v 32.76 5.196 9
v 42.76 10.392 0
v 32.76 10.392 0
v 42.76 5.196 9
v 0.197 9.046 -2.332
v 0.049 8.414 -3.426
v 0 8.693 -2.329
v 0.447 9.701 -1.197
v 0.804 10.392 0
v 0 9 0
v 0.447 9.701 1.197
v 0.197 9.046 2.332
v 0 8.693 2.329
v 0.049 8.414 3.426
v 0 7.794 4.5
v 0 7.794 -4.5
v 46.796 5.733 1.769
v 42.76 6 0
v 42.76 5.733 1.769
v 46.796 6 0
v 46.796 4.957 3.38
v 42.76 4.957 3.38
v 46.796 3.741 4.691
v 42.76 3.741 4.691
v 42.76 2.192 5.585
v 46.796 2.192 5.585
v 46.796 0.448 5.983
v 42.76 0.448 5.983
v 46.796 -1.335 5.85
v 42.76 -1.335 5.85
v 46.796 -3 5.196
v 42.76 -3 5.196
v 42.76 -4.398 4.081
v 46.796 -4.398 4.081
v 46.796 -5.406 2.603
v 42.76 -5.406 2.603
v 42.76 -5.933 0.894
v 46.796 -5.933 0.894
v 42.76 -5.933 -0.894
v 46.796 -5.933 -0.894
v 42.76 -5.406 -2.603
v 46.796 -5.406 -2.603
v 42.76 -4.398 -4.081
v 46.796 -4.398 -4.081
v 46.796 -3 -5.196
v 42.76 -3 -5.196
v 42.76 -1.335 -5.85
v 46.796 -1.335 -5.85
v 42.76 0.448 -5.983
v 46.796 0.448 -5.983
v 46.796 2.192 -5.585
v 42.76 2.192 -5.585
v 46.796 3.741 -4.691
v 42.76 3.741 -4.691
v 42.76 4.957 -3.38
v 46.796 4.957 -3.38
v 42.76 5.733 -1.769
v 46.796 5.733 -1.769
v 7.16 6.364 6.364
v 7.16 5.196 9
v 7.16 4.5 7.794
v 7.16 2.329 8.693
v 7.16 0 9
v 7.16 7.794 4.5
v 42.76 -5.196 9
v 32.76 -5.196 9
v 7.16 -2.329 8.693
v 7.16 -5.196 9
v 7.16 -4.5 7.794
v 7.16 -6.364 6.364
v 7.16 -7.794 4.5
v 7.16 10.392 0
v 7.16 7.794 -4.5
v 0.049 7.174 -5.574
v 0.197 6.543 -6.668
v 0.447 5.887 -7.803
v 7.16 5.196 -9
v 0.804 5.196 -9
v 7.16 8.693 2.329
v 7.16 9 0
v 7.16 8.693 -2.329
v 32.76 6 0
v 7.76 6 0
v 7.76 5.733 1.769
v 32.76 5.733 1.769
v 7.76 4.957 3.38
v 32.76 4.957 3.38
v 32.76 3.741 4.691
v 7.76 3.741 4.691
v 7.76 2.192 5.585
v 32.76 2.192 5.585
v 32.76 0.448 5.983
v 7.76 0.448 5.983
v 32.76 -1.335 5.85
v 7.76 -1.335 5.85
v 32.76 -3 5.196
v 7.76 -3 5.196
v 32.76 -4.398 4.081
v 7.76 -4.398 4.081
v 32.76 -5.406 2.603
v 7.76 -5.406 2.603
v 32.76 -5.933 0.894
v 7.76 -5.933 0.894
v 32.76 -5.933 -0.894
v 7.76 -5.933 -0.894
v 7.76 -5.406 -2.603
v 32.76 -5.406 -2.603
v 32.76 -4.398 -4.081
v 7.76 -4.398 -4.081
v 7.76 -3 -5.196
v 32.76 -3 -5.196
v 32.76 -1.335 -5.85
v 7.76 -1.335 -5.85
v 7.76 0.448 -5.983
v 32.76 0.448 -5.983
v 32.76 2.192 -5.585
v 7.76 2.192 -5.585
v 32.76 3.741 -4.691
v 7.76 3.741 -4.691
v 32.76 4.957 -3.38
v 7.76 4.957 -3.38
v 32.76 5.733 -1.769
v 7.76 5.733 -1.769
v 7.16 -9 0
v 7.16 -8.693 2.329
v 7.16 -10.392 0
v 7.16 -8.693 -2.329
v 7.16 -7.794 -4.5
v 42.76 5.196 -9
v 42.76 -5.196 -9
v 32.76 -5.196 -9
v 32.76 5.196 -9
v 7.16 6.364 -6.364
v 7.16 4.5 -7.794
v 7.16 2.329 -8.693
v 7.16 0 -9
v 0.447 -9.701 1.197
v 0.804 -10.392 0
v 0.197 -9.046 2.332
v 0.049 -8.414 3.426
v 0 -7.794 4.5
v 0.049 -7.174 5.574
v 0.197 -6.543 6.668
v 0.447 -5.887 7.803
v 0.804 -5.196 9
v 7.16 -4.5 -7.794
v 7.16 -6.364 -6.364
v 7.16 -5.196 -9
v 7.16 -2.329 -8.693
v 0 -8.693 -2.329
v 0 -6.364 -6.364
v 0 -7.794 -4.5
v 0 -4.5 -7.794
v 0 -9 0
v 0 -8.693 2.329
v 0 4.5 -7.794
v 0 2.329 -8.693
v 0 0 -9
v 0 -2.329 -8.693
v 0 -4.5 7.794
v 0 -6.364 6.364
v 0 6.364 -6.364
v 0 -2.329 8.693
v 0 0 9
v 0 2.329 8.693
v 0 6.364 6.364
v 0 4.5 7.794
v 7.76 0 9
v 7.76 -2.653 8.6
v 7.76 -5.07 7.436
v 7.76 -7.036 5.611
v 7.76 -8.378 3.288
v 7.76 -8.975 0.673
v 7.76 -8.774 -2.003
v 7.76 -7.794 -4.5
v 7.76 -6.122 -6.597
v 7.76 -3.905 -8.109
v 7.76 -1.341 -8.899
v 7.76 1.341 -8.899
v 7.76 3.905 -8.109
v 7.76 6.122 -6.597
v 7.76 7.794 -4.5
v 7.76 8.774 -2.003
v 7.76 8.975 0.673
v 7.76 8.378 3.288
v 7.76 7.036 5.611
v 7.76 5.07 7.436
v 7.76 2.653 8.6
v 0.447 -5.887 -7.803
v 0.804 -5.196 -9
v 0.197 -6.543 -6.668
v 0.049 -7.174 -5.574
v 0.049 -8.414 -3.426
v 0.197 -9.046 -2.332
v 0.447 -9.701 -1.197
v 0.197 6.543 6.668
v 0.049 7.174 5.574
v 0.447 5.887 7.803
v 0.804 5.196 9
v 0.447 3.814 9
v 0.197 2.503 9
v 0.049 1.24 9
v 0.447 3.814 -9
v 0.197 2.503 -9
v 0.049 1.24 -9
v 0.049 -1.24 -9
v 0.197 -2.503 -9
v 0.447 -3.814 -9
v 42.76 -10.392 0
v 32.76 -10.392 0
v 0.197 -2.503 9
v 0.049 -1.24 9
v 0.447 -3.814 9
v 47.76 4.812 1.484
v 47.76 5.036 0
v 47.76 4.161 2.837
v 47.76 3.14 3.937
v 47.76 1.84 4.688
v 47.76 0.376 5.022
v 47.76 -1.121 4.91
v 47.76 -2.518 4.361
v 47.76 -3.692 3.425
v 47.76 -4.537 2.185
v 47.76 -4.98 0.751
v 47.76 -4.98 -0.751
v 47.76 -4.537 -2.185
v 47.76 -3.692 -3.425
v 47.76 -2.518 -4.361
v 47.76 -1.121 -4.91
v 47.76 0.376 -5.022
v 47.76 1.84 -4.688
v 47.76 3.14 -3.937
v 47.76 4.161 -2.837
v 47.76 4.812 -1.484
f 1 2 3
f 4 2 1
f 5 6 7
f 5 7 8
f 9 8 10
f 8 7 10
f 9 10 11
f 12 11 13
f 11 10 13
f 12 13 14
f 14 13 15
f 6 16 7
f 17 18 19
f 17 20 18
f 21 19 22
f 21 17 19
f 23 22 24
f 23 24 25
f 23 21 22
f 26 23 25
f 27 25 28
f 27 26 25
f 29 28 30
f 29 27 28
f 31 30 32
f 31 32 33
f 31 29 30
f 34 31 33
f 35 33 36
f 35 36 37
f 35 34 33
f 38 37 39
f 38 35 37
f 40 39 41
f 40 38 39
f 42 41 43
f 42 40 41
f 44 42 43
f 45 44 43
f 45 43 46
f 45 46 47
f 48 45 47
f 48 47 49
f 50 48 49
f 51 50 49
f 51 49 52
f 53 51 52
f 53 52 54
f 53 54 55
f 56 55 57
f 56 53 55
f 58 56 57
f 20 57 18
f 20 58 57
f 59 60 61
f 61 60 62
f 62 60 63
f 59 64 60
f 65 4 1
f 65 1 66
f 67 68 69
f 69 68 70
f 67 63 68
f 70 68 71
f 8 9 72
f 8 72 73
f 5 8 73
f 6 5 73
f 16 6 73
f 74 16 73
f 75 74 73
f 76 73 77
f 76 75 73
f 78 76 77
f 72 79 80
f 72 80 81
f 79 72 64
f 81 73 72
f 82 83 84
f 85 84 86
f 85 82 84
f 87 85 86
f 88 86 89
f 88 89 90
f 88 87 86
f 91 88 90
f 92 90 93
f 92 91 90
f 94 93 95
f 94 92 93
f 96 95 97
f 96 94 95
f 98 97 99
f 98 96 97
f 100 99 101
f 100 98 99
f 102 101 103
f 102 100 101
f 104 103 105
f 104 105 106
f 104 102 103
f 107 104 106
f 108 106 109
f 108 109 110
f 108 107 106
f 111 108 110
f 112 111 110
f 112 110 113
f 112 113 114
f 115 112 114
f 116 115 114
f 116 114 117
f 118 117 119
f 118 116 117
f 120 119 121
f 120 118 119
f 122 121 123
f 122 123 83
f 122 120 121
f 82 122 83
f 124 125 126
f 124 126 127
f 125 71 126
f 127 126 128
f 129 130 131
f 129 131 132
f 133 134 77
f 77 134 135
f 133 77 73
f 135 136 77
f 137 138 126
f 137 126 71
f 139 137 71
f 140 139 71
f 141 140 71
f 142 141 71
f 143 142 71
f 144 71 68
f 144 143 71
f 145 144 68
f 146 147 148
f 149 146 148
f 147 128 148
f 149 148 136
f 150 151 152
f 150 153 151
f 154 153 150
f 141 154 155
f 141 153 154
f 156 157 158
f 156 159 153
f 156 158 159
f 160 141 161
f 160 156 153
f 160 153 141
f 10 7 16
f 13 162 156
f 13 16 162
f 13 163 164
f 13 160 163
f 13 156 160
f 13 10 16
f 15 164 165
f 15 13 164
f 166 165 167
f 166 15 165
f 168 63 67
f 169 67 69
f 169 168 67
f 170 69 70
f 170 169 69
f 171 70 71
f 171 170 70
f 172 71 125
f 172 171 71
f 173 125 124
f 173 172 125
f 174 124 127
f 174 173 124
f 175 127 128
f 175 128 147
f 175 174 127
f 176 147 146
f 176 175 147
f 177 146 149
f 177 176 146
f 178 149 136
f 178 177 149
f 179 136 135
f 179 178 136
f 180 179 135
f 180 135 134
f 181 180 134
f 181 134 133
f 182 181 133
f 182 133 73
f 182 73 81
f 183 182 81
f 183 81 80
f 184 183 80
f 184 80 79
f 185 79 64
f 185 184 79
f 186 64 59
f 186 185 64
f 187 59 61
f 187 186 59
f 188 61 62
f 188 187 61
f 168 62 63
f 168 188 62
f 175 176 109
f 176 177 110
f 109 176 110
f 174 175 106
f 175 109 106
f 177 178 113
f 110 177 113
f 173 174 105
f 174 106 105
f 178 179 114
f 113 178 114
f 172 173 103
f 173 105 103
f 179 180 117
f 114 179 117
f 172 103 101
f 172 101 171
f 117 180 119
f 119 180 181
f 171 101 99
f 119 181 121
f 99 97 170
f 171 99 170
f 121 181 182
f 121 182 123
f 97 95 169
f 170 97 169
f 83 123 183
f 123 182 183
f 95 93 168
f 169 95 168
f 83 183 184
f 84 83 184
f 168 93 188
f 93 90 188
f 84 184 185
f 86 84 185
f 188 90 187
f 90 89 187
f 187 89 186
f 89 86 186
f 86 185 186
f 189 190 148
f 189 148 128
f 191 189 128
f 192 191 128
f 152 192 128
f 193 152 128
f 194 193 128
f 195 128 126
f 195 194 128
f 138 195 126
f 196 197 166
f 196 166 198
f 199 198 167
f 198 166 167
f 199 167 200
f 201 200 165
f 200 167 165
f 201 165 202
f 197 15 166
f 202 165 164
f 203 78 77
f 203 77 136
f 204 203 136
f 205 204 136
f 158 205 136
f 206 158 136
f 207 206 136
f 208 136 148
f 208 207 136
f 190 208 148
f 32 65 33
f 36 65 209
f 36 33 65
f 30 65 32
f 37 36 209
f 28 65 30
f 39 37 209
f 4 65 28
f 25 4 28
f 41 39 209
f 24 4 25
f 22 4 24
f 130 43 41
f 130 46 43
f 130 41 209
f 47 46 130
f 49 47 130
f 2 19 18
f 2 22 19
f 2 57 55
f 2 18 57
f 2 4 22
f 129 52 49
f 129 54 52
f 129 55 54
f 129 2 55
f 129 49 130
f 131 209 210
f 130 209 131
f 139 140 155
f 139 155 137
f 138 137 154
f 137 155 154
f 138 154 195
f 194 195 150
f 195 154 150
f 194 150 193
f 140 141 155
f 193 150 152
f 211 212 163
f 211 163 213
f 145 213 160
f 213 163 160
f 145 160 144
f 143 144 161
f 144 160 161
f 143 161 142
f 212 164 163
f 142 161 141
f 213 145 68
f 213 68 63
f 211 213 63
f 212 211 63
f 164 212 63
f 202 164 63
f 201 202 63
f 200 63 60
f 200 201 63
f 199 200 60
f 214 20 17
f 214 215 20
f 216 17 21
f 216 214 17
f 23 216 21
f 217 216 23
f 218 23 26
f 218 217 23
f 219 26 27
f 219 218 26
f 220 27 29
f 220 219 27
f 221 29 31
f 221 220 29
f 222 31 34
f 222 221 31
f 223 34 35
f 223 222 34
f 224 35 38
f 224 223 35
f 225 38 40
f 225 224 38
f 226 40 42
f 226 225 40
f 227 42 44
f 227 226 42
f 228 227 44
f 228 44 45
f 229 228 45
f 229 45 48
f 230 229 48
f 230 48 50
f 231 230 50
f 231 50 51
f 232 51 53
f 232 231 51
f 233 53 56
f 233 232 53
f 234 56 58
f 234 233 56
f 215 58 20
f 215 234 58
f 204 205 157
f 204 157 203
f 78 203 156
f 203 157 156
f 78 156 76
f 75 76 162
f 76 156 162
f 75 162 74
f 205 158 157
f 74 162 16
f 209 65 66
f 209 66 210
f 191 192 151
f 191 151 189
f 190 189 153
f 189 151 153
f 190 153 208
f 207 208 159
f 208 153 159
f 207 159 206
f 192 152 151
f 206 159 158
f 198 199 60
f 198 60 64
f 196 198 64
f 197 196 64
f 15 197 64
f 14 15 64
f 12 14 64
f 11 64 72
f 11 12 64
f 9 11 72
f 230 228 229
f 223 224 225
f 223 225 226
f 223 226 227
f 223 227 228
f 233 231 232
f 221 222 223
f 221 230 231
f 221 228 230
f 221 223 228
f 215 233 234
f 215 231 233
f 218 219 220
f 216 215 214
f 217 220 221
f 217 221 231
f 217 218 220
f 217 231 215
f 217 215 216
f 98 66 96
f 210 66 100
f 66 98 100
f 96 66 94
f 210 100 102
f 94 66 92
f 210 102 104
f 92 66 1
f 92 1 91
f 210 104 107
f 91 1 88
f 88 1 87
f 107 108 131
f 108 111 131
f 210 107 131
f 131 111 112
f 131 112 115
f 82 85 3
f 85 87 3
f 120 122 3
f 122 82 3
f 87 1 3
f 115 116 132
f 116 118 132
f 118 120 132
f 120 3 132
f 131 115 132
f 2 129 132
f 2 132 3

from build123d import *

# Parameters (mm, degrees)
BASEHEAD_DEPTH      = 7.76
SKETCH4_W           = 0.6
SKETCH4_H           = 11.392304845
BOSS_EXTRUDE1_DEPTH = 10


# Read off the part's stored shape, not the designer's step: HeadChamfer
with BuildPart() as part:
    # Sketch1 → BaseHead (new body)
    with BuildSketch(Plane(origin=(0, 0, 0), x_dir=(0, 0, -1), z_dir=(1, 0, 0))):
        Polygon((9, 5.196152423), (9, -5.196152423), (0, -10.392304845), (-9, -5.196152423), (-9, 5.196152423), (0, 10.392304845), align=None)
    extrude(amount=BASEHEAD_DEPTH)

    # HeadChamfer outline → HeadChamfer (revolve, cut)
    with BuildSketch(Plane.YX):
        Polygon((10.392304847, 0.803847578), (9, 0), (10.392304847, 0), align=None)
    revolve(axis=Axis((0, 0, 0), (1, 0, 0)), mode=Mode.SUBTRACT)

    # HeadChamfer 2 outline → HeadChamfer 2 (revolve)
    with BuildSketch(Plane.YX):
        Polygon((6, 7.76), (6, 46.796), (5.036, 47.76), (0, 47.76), (0, 7.76), align=None)
    revolve(axis=Axis((0, 0, 0), (1, 0, 0)))

    # Sketch4 → BearingFace (revolve, cut)
    with BuildSketch(Plane.XY, mode=Mode.PRIVATE) as bearingface_sk:
        with Locations((7.46, 14.696152423)):
            Rectangle(SKETCH4_W, SKETCH4_H)
    revolve(bearingface_sk.sketch.rotate(Axis((0, 0, 0), (1, 0, 0)), 90), axis=Axis((0, 0, 0), (1, 0, 0)), mode=Mode.SUBTRACT)

    # Sketch5 → Boss-Extrude1 (add)
    with BuildSketch(Plane(origin=(42.76, 0, 0), x_dir=(0, 0, -1), z_dir=(1, 0, 0))):
        Polygon((0, 10.392304845), (-9, 5.196152423), (-9, -5.196152423), (0, -10.392304845), (9, -5.196152423), (9, 5.196152423), align=None)
    extrude(amount=-BOSS_EXTRUDE1_DEPTH)


solid = part.part
